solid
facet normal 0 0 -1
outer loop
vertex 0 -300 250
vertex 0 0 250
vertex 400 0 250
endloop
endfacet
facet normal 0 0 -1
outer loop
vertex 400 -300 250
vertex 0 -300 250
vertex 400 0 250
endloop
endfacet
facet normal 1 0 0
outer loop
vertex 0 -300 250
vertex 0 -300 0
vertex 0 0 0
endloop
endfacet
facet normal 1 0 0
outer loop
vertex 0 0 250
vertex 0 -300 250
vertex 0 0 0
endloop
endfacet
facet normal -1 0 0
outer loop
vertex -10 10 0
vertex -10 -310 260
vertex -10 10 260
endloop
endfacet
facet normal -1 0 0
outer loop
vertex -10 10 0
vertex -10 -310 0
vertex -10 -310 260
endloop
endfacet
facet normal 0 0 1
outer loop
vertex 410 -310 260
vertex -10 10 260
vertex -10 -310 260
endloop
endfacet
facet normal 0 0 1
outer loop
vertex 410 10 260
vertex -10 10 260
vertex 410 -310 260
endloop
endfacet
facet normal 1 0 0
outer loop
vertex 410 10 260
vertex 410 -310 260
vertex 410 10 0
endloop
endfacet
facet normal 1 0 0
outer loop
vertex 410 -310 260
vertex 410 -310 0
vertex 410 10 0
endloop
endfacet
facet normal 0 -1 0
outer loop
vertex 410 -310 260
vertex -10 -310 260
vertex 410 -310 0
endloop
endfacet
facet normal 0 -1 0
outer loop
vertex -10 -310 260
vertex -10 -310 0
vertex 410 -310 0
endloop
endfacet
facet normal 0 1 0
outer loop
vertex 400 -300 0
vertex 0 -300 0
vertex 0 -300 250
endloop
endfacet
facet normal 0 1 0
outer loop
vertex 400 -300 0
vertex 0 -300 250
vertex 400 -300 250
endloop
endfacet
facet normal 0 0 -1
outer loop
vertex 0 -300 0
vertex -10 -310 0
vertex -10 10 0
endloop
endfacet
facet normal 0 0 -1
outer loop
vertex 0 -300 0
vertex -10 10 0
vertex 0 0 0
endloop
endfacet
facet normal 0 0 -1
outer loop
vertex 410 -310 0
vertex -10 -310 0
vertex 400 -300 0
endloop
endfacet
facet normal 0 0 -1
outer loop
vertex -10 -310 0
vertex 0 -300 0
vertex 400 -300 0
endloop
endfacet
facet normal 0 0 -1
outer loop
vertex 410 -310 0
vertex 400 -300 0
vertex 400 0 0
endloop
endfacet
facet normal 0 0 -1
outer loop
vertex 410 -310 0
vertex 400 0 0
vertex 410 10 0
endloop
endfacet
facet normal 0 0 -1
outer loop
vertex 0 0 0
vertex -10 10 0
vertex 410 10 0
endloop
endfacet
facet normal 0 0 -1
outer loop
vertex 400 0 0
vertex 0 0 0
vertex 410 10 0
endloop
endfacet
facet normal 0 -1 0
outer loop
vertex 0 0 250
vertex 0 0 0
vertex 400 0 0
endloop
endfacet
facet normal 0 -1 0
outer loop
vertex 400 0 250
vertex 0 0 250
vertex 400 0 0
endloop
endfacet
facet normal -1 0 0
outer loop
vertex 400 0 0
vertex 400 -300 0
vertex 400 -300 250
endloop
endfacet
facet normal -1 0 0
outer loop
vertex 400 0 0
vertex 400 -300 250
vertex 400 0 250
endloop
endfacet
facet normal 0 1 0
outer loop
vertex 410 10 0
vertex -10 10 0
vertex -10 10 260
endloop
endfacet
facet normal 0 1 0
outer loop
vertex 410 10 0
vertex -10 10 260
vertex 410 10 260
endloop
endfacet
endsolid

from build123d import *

# Parameters (mm, degrees)
SKETCH1_W           = 420
SKETCH1_H           = 320
SKETCH1_W_2         = 400
SKETCH1_H_2         = 300
BOSS_EXTRUDE1_DEPTH = 250
SKETCH2_W           = 420
SKETCH2_H           = 320
BOSS_EXTRUDE2_DEPTH = 10


with BuildPart() as part:
    # Sketch1 → Boss-Extrude1 (new body)
    with BuildSketch(Plane.XY):
        with Locations((200, -150)):
            Rectangle(SKETCH1_W, SKETCH1_H)
        with Locations((200, -150)):
            Rectangle(SKETCH1_W_2, SKETCH1_H_2, mode=Mode.SUBTRACT)
    extrude(amount=BOSS_EXTRUDE1_DEPTH)

    # Sketch2 → Boss-Extrude2 (add)
    with BuildSketch(Plane.XY.offset(250)):
        with Locations((200, -150)):
            Rectangle(SKETCH2_W, SKETCH2_H)
    extrude(amount=BOSS_EXTRUDE2_DEPTH)


solid = part.part
